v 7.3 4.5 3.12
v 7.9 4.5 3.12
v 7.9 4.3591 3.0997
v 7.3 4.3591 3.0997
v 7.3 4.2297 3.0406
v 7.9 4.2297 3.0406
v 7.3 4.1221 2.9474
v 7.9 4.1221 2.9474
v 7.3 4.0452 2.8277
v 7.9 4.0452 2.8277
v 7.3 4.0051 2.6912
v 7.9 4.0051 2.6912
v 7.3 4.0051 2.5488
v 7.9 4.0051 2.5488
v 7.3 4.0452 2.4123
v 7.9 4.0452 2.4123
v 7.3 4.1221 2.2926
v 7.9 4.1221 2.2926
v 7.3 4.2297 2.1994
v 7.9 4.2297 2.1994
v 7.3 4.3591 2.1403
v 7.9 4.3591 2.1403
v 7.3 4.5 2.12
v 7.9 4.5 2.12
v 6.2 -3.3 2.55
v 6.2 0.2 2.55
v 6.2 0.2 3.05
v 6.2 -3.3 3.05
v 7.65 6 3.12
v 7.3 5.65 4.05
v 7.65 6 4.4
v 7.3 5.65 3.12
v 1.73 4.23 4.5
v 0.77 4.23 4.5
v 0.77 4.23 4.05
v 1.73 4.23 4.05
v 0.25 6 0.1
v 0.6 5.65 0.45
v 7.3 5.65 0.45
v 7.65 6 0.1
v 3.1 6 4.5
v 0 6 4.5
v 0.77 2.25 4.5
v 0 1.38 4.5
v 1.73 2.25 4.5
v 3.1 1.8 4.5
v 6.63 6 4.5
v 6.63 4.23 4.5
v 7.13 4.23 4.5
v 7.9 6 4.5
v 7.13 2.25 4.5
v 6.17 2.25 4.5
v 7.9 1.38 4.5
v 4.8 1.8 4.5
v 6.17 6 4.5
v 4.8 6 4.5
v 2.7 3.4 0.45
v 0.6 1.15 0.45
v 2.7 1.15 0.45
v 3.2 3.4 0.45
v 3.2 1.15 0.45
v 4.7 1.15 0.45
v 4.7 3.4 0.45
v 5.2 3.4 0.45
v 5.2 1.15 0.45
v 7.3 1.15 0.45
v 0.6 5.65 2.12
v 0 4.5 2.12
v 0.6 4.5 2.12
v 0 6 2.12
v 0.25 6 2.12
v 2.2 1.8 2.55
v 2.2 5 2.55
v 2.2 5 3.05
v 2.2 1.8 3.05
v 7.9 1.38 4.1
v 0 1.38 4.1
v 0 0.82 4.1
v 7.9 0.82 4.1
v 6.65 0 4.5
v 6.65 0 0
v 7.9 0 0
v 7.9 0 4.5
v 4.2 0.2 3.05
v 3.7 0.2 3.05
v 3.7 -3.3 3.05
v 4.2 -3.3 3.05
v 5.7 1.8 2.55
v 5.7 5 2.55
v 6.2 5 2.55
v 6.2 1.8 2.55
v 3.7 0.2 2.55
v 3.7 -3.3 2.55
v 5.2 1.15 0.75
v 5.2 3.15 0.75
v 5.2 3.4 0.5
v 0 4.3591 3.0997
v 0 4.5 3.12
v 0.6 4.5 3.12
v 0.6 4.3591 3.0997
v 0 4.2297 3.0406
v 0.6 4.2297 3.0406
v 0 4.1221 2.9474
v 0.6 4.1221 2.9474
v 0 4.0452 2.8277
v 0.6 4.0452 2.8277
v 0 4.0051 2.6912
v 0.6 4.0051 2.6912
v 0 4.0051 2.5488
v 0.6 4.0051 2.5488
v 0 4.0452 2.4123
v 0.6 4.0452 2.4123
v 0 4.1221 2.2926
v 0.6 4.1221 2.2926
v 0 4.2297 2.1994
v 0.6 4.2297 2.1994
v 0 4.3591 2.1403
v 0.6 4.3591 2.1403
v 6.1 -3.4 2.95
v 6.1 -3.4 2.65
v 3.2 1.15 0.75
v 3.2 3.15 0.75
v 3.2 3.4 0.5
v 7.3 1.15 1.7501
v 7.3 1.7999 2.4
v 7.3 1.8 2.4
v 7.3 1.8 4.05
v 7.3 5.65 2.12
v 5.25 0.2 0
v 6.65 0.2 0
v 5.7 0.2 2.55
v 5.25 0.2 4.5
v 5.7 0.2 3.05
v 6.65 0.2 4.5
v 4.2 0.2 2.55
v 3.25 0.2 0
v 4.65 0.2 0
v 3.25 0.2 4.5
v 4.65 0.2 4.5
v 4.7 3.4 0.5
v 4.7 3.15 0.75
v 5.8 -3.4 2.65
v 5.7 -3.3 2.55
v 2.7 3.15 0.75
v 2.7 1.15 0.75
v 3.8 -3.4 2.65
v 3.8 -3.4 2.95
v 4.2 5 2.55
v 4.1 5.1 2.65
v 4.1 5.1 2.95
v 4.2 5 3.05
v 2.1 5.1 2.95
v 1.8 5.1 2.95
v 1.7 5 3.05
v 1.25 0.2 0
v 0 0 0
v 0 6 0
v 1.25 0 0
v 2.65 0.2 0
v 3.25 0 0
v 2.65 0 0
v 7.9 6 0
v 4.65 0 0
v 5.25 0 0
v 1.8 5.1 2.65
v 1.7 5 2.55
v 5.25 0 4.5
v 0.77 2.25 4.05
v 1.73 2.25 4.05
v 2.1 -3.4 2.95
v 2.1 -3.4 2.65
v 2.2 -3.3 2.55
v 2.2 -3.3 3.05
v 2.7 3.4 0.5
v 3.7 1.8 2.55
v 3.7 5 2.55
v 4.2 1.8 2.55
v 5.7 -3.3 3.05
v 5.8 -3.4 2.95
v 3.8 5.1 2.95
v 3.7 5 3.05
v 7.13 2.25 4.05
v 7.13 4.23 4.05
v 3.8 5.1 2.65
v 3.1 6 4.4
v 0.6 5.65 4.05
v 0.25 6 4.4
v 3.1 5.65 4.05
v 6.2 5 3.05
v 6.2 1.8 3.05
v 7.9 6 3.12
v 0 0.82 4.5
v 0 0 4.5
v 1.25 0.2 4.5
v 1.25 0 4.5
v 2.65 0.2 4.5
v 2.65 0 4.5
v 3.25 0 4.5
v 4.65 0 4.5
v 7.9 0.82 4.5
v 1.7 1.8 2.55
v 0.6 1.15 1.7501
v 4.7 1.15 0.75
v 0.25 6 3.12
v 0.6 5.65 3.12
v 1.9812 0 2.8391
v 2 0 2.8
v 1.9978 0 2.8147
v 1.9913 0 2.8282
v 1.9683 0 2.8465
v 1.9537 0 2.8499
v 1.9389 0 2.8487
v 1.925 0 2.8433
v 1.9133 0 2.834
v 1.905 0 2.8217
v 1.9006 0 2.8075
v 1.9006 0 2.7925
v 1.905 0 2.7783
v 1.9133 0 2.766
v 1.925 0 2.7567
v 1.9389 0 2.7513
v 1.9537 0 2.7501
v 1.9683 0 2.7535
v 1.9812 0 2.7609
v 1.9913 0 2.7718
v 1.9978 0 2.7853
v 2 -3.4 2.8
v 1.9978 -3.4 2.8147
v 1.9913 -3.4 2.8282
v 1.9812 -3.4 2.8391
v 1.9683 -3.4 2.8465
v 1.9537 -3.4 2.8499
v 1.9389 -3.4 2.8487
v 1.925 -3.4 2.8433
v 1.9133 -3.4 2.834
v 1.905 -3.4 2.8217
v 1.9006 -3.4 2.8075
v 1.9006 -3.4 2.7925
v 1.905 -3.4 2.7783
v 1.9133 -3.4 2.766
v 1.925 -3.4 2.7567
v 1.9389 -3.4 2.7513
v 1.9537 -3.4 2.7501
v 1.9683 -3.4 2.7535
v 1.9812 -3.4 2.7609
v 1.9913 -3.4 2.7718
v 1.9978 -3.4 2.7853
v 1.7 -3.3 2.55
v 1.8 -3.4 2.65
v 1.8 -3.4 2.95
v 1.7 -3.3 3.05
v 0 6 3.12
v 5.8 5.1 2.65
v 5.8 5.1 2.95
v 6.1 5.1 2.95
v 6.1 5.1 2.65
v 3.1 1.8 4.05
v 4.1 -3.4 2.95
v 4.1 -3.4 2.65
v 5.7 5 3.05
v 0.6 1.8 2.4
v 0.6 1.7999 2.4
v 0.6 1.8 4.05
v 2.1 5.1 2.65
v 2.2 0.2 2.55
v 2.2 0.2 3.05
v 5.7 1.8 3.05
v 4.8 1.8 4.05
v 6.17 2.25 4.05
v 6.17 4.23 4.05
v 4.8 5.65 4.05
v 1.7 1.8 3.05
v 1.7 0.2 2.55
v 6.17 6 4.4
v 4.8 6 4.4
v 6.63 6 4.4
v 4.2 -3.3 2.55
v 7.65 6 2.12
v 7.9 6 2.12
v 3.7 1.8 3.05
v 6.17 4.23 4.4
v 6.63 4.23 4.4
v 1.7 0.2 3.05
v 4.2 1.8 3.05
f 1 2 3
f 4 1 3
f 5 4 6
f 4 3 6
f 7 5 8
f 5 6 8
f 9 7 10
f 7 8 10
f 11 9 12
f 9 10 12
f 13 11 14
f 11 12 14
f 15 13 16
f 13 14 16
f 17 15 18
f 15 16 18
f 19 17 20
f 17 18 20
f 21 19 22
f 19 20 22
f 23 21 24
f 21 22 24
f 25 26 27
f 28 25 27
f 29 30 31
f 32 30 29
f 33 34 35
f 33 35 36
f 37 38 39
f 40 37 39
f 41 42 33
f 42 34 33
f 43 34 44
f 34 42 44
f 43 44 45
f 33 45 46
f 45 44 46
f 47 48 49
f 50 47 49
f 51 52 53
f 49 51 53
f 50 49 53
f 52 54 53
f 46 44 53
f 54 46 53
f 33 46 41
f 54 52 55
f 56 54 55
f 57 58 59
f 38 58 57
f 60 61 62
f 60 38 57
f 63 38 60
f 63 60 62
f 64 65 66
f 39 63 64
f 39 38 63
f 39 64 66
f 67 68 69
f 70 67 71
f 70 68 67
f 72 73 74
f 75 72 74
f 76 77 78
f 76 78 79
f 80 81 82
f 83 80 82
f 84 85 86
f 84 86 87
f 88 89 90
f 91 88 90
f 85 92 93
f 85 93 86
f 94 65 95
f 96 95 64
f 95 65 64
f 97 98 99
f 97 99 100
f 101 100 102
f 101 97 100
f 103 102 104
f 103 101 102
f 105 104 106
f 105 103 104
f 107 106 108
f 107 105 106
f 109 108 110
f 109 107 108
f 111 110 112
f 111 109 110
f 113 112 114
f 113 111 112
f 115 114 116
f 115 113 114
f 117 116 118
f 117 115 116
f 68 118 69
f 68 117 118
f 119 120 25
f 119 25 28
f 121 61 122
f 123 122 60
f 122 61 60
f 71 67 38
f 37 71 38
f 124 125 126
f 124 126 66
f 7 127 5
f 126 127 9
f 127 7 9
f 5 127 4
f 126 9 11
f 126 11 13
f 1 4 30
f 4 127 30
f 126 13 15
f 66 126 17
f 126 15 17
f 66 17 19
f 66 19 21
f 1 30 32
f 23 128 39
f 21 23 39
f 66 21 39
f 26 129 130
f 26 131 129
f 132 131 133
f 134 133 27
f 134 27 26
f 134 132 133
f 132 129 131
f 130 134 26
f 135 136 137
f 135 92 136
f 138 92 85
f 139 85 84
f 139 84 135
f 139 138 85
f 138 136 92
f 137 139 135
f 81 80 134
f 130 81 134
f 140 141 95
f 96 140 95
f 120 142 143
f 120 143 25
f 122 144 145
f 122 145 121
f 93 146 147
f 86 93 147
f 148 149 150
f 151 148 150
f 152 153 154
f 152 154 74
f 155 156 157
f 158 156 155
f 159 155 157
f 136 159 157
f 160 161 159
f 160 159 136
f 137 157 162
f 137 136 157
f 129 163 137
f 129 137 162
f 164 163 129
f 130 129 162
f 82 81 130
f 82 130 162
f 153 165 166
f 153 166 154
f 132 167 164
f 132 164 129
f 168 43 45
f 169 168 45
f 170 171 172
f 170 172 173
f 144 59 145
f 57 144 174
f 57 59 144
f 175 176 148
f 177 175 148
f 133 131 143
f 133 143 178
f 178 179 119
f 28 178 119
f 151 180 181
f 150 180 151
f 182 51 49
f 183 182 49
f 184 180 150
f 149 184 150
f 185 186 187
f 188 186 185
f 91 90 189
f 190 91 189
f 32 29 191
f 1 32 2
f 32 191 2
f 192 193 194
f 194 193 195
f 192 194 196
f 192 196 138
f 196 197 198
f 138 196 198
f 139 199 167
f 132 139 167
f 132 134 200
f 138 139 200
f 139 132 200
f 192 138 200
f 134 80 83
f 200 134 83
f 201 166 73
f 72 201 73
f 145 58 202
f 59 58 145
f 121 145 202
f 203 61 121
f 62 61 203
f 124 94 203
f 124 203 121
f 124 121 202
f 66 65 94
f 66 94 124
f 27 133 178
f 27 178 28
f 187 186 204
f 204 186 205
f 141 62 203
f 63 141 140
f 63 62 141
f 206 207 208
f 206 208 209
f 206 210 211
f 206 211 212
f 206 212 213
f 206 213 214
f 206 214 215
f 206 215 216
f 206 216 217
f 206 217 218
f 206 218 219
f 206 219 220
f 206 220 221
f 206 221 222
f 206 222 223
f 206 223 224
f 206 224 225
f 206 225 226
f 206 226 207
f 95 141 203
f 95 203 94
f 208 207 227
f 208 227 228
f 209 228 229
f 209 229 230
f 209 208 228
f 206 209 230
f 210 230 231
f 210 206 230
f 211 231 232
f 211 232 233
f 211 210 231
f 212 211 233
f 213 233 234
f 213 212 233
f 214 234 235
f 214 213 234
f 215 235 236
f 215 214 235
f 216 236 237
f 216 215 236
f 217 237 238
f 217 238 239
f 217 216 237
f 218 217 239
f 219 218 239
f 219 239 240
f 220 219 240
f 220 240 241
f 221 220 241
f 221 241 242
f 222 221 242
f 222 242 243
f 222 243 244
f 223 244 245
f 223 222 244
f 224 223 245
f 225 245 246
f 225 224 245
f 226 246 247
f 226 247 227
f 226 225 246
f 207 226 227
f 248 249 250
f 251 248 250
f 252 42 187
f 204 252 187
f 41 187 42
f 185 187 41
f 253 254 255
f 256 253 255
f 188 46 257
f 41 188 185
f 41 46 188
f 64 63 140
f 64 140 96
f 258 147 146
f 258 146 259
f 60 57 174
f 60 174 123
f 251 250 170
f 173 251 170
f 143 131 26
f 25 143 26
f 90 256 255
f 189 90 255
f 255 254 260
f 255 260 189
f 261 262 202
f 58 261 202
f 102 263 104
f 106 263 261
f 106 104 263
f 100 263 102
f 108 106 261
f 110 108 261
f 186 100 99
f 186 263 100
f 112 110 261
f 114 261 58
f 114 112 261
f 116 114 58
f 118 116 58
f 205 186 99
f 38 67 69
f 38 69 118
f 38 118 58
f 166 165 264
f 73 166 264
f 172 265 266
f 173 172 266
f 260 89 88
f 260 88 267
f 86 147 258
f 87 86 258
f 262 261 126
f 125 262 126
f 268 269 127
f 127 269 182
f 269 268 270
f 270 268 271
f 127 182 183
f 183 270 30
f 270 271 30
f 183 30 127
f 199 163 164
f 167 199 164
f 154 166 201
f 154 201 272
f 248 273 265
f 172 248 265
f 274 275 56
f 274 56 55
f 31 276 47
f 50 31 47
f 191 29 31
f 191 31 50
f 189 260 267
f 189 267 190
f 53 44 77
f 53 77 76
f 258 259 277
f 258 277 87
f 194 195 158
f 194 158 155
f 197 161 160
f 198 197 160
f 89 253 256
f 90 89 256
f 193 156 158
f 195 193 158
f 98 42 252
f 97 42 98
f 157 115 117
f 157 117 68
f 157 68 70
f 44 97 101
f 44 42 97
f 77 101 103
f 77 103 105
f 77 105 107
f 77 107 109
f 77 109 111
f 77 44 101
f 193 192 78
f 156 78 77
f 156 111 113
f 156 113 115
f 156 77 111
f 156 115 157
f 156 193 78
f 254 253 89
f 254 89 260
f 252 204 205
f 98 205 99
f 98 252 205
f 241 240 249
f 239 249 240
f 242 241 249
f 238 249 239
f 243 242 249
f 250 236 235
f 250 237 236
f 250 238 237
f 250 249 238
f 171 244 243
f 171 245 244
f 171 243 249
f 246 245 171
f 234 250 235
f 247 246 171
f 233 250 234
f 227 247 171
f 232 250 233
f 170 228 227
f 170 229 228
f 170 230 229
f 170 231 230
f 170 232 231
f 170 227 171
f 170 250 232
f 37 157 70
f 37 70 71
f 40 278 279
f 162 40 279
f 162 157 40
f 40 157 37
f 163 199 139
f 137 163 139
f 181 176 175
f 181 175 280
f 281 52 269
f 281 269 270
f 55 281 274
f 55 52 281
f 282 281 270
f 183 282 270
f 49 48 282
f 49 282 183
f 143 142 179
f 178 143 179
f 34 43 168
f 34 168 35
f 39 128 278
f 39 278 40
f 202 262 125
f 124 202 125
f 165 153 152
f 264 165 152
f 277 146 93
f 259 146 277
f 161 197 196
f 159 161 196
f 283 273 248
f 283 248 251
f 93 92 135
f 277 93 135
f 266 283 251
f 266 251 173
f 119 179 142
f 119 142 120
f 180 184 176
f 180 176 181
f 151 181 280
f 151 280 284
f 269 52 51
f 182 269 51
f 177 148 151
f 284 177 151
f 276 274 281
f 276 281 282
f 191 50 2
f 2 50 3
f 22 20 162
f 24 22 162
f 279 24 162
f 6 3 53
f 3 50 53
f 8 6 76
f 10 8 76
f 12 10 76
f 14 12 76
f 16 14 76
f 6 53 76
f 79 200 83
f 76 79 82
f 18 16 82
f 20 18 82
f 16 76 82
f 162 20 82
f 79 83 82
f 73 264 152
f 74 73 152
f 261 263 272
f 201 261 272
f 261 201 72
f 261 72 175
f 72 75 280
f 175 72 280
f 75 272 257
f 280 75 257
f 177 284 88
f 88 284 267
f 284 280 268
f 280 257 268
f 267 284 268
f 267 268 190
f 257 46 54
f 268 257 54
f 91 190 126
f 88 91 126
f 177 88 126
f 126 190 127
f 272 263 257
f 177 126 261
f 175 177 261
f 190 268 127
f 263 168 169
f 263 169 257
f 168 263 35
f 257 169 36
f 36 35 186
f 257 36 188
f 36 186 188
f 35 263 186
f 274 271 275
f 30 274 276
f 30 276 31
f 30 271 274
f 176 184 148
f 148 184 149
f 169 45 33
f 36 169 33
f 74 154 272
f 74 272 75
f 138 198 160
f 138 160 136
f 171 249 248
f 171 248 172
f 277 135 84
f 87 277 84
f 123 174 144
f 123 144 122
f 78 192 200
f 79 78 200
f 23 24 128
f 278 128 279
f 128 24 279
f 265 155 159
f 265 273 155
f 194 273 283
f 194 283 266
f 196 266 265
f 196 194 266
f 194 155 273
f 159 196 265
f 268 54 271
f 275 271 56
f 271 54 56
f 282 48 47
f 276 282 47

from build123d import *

# Parameters (mm, degrees)
BODY1_W                            = 7.9
BODY1_H                            = 4.5
EXTRUDE_1_DEPTH                    = 6
SKETCH_2_W                         = 6.7
SKETCH_2_H                         = 3.6
CUT_EXTRUDE_1_DEPTH                = 4.2
SKETCH_3_W                         = 7.9
SKETCH_3_H                         = 0.56
CUT_EXTRUDE_2_DEPTH                = 0.4
CHAMFER_1_SIZE                     = 0.35
CUT_EXTRUDE_3_REACH                = 12.893
SKETCH_4_W                         = 0.96
SKETCH_4_H                         = 1.98
SKETCH_5_W                         = 1.4
SKETCH_5_H                         = 0.2
CUT_EXTRUDE_4_DEPTH                = 11.893117093
SKETCH_7_W                         = 0.46
SKETCH_7_H                         = 1.77
CUT_EXTRUDE_5_DEPTH                = 0.1
CUT_EXTRUDE_6_REACH                = 12.893
SKETCH_8_W                         = 1.7
SKETCH_8_H                         = 4.2
CUT_EXTRUDE_7_REACH                = 12.893
SKETCH_15_W                        = 6.7
SKETCH_15_H                        = 1.95
CUT_EXTRUDE_9_DEPTH                = 0.65
CHAMFER_7_SIZE                     = 0.65
SKETCH_10_W                        = 0.5
SKETCH_10_H                        = 2.25
EXTRUDE_2_DEPTH                    = 0.3
CHAMFER_2_SIZE                     = 0.25
PATTERN_LINEAR_3_COUNT             = 2
PATTERN_LINEAR_3_PITCH             = 2
CHAMFER_2_OF_PATTERN_LINEAR_3_SIZE = 0.25
EXTRUDE_START                      = -4.9
SKETCH_12_W                        = 0.5
SKETCH_12_H                        = 0.5
EXTRUDE_4_DEPTH                    = 8.5
CHAMFER_3_SIZE                     = 0.1
CHAMFER_4_SIZE                     = 0.1
PATTERN_LINEAR_2_COUNT             = 3
PATTERN_LINEAR_2_PITCH             = 2
CHAMFER_3_OF_PATTERN_LINEAR_2_SIZE = 0.1
CHAMFER_4_OF_PATTERN_LINEAR_2_SIZE = 0.1
SKETCH_16_R                        = 0.05
CUT_EXTRUDE_10_DEPTH               = 3.4


with BuildPart() as part:
    # Body1 → Бобышка-Вытянуть1 (new body)
    with BuildSketch(Plane(origin=(0, 0, 0), x_dir=(1, 0, 0), z_dir=(0, 1, 0))):
        with Locations((3.95, -2.25)):
            Rectangle(BODY1_W, BODY1_H)
    extrude(amount=EXTRUDE_1_DEPTH)

    # Эскиз2 → Вырез-Вытянуть1 (cut)
    with BuildSketch(Plane(origin=(0, 6, 0), x_dir=(1, 0, 0), z_dir=(0, 1, 0))):
        with Locations((3.95, -2.25)):
            Rectangle(SKETCH_2_W, SKETCH_2_H)
    extrude(amount=-CUT_EXTRUDE_1_DEPTH, mode=Mode.SUBTRACT)

    # Эскиз3 → Вырез-Вытянуть2 (cut)
    with BuildSketch(Plane.XY.offset(4.5)):
        with Locations((3.95, 1.1)):
            Rectangle(SKETCH_3_W, SKETCH_3_H)
    extrude(amount=-CUT_EXTRUDE_2_DEPTH, mode=Mode.SUBTRACT)

    # Фаска1
    chamfer_1_edges = [part.edges().sort_by_distance(p)[0] for p in [
        (3.95, 6, 4.05),
        (7.3, 6, 2.25),
        (3.95, 6, 0.45),
        (0.6, 6, 2.25),
    ]]
    chamfer(chamfer_1_edges, length=CHAMFER_1_SIZE)

    # Эскиз4 → Вырез-Вытянуть3 (cut, up to next)
    with BuildSketch(Plane.XY.offset(4.5), mode=Mode.PRIVATE) as cut_extrude_3_sk1:
        with Locations((1.25, 3.24)):
            Rectangle(SKETCH_4_W, SKETCH_4_H)
    cut_extrude_3_tool1 = extrude(cut_extrude_3_sk1.sketch, amount=-CUT_EXTRUDE_3_REACH, mode=Mode.PRIVATE) & part.part
    # Эскиз4 → Вырез-Вытянуть3 (cut, up to next)
    with BuildSketch(Plane.XY.offset(4.5), mode=Mode.PRIVATE) as cut_extrude_3_sk2:
        with Locations((6.65, 3.24)):
            Rectangle(SKETCH_4_W, SKETCH_4_H)
    cut_extrude_3_tool2 = extrude(cut_extrude_3_sk2.sketch, amount=-CUT_EXTRUDE_3_REACH, mode=Mode.PRIVATE) & part.part
    add(cut_extrude_3_tool1.solids().sort_by_distance((1.25, 3.24, 4.5))[0], mode=Mode.SUBTRACT)
    add(cut_extrude_3_tool2.solids().sort_by_distance((6.65, 3.24, 4.5))[0], mode=Mode.SUBTRACT)

    # Эскиз5 → Вырез-Вытянуть4 (cut, through all)
    with BuildSketch(Plane.XY.offset(4.5)):
        with Locations((1.95, 0.1)):
            Rectangle(SKETCH_5_W, SKETCH_5_H)
    cut_extrude_4 = extrude(amount=-CUT_EXTRUDE_4_DEPTH, mode=Mode.SUBTRACT)

    # Эскиз7 → Вырез-Вытянуть5 (cut)
    with BuildSketch(Plane.XY.offset(4.5)):
        with Locations((6.4, 5.115)):
            Rectangle(SKETCH_7_W, SKETCH_7_H)
    extrude(amount=-CUT_EXTRUDE_5_DEPTH, mode=Mode.SUBTRACT)

    # Эскиз8 → Вырез-Вытянуть6 (cut, up to next)
    with BuildSketch(Plane.XY.offset(4.5), mode=Mode.PRIVATE) as cut_extrude_6_sk1:
        with Locations((3.95, 3.9)):
            Rectangle(SKETCH_8_W, SKETCH_8_H)
    cut_extrude_6_tool1 = extrude(cut_extrude_6_sk1.sketch, amount=-CUT_EXTRUDE_6_REACH, mode=Mode.PRIVATE) & part.part
    add(cut_extrude_6_tool1.solids().sort_by_distance((3.95, 3.9, 4.5))[0], mode=Mode.SUBTRACT)

    # Эскиз9 → Вырез-Вытянуть7 (cut, up to next)
    with BuildSketch(Plane.ZY, mode=Mode.PRIVATE) as cut_extrude_7_sk1:
        with BuildLine():
            Line((2.12, 6), (3.12, 6))
            Line((3.12, 6), (3.12, 4.5))
            ThreePointArc((3.12, 4.5), (2.62, 4), (2.12, 4.5))
            Line((2.12, 4.5), (2.12, 6))
        make_face()
    cut_extrude_7_tool1 = extrude(cut_extrude_7_sk1.sketch, amount=-CUT_EXTRUDE_7_REACH, mode=Mode.PRIVATE) & part.part
    cut_extrude_7 = cut_extrude_7_tool1.solids().sort_by_distance((0, 5.05036, 2.62))[0]
    add(cut_extrude_7, mode=Mode.SUBTRACT)

    # Зеркальное отражение1: Вырез-Вытянуть7 across plane
    add(cut_extrude_7.mirror(Plane(origin=(3.95, 0, 0), x_dir=(0, 0, 1), z_dir=(1, 0, 0))), mode=Mode.SUBTRACT)

    # Эскиз15 → Вырез-Вытянуть9 (cut)
    with BuildSketch(Plane(origin=(0, 1.8, 0), x_dir=(1, 0, 0), z_dir=(0, 1, 0))):
        with Locations((3.95, -1.425)):
            Rectangle(SKETCH_15_W, SKETCH_15_H)
    extrude(amount=-CUT_EXTRUDE_9_DEPTH, mode=Mode.SUBTRACT)

    # Фаска7
    chamfer_7_edges = [part.edges().sort_by_distance(p)[0] for p in [
        (3.95, 1.15, 2.4),
    ]]
    chamfer(chamfer_7_edges, length=CHAMFER_7_SIZE - 0.0001)  # a hair under: the kernel refuses the full size

    # Эскиз10 → Бобышка-Вытянуть2 (add)
    with BuildSketch(Plane.XY.offset(0.45)):
        with Locations((2.95, 2.275)):
            Rectangle(SKETCH_10_W, SKETCH_10_H)
    extrude_2 = extrude(amount=EXTRUDE_2_DEPTH)

    # Фаска2
    chamfer_2_edges = [part.edges().sort_by_distance(p)[0] for p in [
        (2.95, 3.4, 0.75),
    ]]
    chamfer(chamfer_2_edges, length=CHAMFER_2_SIZE)

    # Линейный массив3: Бобышка-Вытянуть2 ×2
    with Locations(*[(i * PATTERN_LINEAR_3_PITCH, 0, 0) for i in range(1, PATTERN_LINEAR_3_COUNT)]):
        add(extrude_2)

    # Фаска2 of Линейный массив3
    chamfer_2_of_pattern_linear_3_edges = [part.edges().sort_by_distance(p)[0] for p in [
        (4.95, 3.4, 0.75),
    ]]
    chamfer(chamfer_2_of_pattern_linear_3_edges, length=CHAMFER_2_OF_PATTERN_LINEAR_3_SIZE)

    # Эскиз12 → Бобышка-Вытянуть4 (add)
    with BuildSketch(Plane.XZ.offset(-0.2).offset(EXTRUDE_START)):
        with Locations((1.95, 2.8)):
            Rectangle(SKETCH_12_W, SKETCH_12_H)
    extrude_4 = extrude(amount=EXTRUDE_4_DEPTH)

    # Фаска3
    chamfer_3_edges = [part.edges().sort_by_distance(p)[0] for p in [
        (1.7, -3.4, 2.8),
        (1.95, -3.4, 2.55),
        (2.2, -3.4, 2.8),
        (1.95, -3.4, 3.05),
    ]]
    chamfer(chamfer_3_edges, length=CHAMFER_3_SIZE)

    # Фаска4
    chamfer_4_edges = [part.edges().sort_by_distance(p)[0] for p in [
        (1.7, 5.1, 2.8),
        (1.95, 5.1, 2.55),
        (2.2, 5.1, 2.8),
        (1.95, 5.1, 3.05),
    ]]
    chamfer(chamfer_4_edges, length=CHAMFER_4_SIZE)

    # Линейный массив2: Вырез-Вытянуть4, Бобышка-Вытянуть4 ×3
    with Locations(*[(i * PATTERN_LINEAR_2_PITCH, 0, 0) for i in range(1, PATTERN_LINEAR_2_COUNT)]):
        add(cut_extrude_4, mode=Mode.SUBTRACT)
        add(extrude_4)

    # Фаска3 of Линейный массив2
    chamfer_3_of_pattern_linear_2_edges = [part.edges().sort_by_distance(p)[0] for p in [
        (3.7, -3.4, 2.8),
        (3.95, -3.4, 2.55),
        (4.2, -3.4, 2.8),
        (3.95, -3.4, 3.05),
        (5.7, -3.4, 2.8),
        (5.95, -3.4, 2.55),
        (6.2, -3.4, 2.8),
        (5.95, -3.4, 3.05),
    ]]
    chamfer(chamfer_3_of_pattern_linear_2_edges, length=CHAMFER_3_OF_PATTERN_LINEAR_2_SIZE)

    # Фаска4 of Линейный массив2
    chamfer_4_of_pattern_linear_2_edges = [part.edges().sort_by_distance(p)[0] for p in [
        (3.7, 5.1, 2.8),
        (3.95, 5.1, 2.55),
        (4.2, 5.1, 2.8),
        (3.95, 5.1, 3.05),
        (5.7, 5.1, 2.8),
        (5.95, 5.1, 2.55),
        (6.2, 5.1, 2.8),
        (5.95, 5.1, 3.05),
    ]]
    chamfer(chamfer_4_of_pattern_linear_2_edges, length=CHAMFER_4_OF_PATTERN_LINEAR_2_SIZE)

    # Эскиз16 → Вырез-Вытянуть10 (cut)
    with BuildSketch(Plane.XZ):
        with Locations((1.95, 2.8)):
            Circle(SKETCH_16_R)
    extrude(amount=CUT_EXTRUDE_10_DEPTH, mode=Mode.SUBTRACT)


solid = part.part
